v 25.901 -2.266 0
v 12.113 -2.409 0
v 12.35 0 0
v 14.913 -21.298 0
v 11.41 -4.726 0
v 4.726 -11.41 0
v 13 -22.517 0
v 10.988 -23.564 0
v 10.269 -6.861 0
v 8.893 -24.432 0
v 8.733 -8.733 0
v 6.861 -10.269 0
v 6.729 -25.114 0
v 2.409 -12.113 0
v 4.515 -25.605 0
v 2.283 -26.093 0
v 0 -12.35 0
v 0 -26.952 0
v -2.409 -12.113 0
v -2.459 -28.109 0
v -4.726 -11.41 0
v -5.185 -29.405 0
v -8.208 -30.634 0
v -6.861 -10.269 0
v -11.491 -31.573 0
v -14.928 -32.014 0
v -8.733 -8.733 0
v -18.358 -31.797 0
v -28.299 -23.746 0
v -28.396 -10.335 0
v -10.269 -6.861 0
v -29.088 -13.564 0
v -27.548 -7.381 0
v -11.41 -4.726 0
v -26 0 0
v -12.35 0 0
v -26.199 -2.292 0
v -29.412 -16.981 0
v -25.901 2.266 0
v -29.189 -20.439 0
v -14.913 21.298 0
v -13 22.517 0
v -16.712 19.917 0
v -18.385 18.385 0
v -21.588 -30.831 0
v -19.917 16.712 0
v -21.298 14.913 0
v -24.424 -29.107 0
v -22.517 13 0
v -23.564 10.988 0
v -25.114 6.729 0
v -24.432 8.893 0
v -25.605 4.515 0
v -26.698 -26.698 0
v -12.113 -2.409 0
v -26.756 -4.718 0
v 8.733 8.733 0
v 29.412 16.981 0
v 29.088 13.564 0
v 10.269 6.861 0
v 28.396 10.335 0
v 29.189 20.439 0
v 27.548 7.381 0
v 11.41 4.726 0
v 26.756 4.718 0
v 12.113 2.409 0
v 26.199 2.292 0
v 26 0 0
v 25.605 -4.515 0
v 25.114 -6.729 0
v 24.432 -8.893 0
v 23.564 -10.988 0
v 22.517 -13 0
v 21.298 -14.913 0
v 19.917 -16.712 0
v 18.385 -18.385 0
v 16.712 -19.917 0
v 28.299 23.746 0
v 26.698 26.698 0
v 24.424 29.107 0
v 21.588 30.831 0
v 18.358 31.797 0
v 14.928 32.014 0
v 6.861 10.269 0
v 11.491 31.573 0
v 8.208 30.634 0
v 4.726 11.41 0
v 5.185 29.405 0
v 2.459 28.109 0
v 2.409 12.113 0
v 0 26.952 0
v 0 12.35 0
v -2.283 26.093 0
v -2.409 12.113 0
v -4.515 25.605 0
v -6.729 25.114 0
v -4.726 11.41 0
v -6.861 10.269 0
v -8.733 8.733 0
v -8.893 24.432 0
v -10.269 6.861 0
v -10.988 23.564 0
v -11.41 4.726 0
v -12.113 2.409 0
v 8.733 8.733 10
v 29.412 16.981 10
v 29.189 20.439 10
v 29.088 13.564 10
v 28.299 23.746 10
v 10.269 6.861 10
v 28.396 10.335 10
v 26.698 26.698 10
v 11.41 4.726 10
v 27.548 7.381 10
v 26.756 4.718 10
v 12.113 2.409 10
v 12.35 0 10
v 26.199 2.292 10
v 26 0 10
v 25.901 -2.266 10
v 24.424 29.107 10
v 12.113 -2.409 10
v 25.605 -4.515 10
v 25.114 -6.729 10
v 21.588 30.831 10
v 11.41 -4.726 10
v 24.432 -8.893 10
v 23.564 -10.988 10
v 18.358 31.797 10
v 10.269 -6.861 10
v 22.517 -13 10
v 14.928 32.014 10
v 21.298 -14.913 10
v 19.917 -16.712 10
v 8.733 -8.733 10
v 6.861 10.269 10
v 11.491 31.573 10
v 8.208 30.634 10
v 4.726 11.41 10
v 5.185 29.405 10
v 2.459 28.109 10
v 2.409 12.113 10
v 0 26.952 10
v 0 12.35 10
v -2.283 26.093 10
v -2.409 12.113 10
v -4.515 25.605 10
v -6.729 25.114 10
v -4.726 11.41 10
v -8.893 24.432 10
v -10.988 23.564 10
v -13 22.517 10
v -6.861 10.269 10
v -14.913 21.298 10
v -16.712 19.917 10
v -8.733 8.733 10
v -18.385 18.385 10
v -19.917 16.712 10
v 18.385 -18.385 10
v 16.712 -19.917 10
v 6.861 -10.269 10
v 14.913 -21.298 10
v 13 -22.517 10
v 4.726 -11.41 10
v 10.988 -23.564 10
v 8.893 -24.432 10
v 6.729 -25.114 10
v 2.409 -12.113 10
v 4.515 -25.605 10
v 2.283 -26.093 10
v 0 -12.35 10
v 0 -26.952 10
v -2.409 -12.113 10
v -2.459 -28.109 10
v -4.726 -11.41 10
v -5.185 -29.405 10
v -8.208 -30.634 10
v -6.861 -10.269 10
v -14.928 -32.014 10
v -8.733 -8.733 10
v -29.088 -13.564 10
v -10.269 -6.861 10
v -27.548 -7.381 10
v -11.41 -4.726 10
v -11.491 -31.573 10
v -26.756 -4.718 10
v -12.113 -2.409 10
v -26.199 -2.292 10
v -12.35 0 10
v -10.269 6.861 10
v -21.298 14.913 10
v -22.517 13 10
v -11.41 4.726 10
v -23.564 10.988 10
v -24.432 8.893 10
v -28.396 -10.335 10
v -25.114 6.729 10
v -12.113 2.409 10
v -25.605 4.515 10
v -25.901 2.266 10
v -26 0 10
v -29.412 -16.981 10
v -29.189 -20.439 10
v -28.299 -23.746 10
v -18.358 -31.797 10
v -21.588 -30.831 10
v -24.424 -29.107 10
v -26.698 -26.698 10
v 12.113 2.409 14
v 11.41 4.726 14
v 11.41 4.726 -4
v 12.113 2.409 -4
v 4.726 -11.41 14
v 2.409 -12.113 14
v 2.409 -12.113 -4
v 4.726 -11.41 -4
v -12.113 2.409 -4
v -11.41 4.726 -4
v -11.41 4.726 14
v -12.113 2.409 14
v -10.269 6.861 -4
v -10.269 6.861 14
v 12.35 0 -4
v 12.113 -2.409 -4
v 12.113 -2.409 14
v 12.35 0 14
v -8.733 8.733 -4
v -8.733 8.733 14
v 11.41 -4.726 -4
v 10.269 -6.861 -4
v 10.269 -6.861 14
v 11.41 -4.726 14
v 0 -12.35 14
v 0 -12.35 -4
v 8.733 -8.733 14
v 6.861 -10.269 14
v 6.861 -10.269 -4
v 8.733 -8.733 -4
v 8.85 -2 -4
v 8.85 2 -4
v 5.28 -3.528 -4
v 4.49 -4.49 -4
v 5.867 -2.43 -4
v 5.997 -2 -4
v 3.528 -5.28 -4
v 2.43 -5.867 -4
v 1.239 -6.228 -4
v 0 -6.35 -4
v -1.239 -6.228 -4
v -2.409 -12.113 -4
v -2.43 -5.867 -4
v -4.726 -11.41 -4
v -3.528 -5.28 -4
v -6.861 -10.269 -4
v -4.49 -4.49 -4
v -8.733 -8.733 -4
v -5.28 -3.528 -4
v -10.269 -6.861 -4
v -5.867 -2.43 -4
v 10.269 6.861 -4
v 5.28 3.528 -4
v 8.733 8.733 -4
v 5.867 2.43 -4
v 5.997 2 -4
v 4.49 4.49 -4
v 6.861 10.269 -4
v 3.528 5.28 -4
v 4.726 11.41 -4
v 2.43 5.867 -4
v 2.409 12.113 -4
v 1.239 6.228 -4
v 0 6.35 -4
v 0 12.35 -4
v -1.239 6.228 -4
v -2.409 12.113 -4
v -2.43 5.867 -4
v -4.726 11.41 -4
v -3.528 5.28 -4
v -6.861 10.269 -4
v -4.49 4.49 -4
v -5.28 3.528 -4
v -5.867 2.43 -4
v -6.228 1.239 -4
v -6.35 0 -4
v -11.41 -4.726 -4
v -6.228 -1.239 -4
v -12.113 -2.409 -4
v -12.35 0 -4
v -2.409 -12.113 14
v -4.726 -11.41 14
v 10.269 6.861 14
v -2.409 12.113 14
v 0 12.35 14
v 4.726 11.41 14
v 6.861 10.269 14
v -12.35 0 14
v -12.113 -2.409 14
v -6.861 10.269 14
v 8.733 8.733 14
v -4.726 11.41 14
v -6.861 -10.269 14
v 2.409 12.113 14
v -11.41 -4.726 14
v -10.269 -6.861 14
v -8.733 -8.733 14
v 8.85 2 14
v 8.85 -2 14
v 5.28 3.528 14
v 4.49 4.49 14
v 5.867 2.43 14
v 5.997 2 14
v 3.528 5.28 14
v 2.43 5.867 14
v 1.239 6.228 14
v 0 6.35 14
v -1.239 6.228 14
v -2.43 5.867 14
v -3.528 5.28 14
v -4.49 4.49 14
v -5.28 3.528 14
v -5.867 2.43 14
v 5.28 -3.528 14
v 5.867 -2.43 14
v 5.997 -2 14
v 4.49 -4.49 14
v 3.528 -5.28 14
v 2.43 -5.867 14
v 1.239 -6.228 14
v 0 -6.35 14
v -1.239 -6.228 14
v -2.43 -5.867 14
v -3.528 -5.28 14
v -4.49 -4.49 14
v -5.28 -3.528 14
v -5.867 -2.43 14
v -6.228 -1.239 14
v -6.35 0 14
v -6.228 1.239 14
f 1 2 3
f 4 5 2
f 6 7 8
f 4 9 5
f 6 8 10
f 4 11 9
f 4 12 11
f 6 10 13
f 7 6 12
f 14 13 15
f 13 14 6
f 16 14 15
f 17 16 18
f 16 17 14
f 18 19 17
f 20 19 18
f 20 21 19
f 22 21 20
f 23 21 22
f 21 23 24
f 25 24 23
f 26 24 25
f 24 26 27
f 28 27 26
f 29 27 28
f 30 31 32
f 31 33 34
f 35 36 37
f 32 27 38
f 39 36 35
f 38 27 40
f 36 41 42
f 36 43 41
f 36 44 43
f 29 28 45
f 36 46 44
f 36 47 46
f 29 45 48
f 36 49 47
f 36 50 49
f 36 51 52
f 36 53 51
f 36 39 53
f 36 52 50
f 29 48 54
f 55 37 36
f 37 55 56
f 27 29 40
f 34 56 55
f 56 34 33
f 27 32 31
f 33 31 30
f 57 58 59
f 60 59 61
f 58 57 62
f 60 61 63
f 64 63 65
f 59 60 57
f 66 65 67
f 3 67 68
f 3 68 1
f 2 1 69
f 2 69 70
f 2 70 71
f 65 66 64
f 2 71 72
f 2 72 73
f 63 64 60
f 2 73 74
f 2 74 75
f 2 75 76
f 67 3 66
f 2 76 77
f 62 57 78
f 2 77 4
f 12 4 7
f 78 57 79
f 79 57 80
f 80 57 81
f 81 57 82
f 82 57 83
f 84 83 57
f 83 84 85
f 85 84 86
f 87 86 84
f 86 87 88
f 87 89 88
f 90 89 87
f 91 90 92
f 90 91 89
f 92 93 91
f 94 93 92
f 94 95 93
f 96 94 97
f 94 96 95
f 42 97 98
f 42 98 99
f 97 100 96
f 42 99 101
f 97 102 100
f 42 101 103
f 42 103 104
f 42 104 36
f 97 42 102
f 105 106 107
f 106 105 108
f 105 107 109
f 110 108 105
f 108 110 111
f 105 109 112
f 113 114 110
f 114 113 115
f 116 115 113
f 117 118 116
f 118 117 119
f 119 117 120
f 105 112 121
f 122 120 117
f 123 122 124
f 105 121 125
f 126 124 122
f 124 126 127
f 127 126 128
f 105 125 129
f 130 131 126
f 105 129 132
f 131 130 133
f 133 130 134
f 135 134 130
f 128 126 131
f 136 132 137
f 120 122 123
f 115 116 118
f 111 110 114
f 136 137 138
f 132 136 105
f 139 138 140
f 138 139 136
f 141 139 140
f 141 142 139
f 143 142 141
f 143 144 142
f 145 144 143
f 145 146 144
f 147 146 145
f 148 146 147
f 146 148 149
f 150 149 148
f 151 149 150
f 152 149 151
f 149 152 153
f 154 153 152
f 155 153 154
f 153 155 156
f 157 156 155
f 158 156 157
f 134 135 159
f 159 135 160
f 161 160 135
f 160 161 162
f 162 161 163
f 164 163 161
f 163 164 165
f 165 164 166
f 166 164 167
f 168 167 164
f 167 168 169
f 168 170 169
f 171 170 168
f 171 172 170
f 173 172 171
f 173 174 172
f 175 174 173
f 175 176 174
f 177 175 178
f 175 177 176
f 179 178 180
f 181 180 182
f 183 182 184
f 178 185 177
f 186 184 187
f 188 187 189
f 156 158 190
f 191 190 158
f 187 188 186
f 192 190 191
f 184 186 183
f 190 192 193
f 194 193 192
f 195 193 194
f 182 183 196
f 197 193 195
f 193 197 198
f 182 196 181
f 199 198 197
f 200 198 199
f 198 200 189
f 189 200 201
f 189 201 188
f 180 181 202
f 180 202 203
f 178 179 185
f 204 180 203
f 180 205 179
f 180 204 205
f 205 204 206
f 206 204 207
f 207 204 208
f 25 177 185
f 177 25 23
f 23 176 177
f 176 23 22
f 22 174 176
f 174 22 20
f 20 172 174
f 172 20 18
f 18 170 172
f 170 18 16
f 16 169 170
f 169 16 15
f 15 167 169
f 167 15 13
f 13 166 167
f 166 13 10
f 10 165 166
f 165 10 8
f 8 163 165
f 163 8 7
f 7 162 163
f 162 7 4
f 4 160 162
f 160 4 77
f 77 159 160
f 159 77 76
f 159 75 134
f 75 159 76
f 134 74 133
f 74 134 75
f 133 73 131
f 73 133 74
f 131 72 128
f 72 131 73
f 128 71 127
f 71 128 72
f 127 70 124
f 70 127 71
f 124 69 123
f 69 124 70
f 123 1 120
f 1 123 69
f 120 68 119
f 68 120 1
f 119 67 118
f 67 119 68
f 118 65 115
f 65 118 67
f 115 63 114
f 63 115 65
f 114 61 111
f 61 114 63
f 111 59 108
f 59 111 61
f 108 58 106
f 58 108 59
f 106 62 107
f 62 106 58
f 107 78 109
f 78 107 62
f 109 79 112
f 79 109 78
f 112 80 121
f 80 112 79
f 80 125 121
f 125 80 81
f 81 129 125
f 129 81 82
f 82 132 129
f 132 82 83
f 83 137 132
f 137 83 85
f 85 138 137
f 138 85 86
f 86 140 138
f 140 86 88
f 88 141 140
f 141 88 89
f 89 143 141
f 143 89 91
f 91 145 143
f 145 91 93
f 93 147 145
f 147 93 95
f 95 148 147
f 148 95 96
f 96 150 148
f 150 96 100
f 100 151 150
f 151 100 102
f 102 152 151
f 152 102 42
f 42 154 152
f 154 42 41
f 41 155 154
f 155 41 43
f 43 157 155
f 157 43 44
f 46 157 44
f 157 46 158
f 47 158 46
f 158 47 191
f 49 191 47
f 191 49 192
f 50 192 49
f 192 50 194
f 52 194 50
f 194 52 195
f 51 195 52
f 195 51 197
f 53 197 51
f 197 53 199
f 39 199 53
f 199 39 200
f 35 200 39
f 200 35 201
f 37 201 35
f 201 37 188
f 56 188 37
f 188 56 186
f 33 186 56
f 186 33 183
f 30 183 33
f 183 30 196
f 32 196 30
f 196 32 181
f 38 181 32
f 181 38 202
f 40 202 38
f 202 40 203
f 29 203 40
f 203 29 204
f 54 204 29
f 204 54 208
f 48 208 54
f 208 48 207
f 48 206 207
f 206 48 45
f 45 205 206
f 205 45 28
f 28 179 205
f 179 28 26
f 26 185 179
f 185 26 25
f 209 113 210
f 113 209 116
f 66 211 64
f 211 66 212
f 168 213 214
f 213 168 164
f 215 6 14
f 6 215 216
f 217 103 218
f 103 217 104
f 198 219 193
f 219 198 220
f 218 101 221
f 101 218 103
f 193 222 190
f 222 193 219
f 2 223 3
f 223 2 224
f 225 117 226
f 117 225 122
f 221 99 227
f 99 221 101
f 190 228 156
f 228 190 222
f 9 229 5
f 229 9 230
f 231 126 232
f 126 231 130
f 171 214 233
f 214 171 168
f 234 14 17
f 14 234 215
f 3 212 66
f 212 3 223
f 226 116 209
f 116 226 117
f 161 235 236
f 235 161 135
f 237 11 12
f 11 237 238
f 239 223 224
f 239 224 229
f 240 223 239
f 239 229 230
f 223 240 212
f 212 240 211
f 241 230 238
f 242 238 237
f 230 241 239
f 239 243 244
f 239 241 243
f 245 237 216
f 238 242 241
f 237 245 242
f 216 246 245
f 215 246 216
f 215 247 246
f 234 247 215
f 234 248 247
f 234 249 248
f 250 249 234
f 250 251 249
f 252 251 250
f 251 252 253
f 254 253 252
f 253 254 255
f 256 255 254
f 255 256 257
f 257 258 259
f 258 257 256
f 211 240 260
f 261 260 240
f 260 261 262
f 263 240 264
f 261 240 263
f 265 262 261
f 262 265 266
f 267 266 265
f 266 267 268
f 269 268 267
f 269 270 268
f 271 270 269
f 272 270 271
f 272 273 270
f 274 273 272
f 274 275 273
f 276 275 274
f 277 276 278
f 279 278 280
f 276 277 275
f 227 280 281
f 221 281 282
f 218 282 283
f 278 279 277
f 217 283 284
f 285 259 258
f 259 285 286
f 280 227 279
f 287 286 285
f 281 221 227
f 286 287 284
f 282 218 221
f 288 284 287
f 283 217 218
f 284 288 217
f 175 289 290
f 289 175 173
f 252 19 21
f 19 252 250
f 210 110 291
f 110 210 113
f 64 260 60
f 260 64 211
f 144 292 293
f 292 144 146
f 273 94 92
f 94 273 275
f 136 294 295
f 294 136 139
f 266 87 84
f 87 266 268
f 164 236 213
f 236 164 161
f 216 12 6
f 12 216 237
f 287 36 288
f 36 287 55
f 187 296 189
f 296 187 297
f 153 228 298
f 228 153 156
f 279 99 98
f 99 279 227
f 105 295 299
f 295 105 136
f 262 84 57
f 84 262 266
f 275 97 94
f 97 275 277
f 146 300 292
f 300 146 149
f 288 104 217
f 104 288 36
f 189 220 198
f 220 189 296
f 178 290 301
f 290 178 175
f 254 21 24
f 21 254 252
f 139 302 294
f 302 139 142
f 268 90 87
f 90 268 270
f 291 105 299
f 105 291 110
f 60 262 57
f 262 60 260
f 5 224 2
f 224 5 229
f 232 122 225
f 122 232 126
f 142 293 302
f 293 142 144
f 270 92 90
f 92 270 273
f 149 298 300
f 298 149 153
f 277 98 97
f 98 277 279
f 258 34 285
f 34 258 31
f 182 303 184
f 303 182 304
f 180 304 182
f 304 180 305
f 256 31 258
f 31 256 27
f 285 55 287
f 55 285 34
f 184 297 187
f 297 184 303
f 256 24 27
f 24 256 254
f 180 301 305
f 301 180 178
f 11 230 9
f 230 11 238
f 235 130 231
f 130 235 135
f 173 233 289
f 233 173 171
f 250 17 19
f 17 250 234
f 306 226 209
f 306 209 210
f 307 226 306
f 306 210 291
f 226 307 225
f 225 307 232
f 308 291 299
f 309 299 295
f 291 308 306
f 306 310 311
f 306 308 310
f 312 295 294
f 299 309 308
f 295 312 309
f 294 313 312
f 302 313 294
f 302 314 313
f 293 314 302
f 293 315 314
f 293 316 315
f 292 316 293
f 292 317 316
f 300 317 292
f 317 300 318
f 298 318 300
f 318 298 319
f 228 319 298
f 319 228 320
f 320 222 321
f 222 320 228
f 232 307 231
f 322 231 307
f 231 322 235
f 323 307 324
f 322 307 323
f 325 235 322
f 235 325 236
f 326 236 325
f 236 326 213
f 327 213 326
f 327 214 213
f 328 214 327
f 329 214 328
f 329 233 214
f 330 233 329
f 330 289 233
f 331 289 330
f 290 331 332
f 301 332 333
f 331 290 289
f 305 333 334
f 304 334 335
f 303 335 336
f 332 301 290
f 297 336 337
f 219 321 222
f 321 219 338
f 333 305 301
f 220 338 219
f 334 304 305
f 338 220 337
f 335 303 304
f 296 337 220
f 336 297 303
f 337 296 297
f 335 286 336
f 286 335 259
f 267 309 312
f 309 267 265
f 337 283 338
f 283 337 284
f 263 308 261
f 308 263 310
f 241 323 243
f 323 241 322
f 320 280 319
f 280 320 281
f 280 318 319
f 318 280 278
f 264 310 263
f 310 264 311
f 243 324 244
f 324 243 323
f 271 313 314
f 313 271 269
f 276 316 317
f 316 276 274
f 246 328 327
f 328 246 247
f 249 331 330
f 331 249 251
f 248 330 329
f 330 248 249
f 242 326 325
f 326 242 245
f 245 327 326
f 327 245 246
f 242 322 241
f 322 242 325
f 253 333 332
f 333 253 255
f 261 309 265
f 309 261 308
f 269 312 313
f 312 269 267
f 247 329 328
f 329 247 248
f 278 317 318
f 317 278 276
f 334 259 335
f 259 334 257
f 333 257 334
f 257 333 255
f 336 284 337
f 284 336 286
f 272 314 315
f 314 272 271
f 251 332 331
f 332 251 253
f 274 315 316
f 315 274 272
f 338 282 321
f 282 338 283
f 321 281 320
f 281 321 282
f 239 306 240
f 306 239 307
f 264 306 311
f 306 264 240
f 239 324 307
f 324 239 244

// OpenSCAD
$fn = 32;

// ----------------------------------------------------------------------
// Cam: base radius 26 mm with a 12 mm lift over 180 degrees
// ----------------------------------------------------------------------

// --- parameters (mm) ---
base_r = 26;              // base radius
lift = 12;                // lift height above the base radius
lift_span = 180;          // angular width of the lift
lift_start = 0;           // angle where the lift starts
cam_t = 10;               // cam plate thickness
hub_d = 24.7;             // hub diameter
hub_h = 18;               // hub height
bore_d = 12.7;            // bore
key_w = 4;                // keyway width
key_depth = 2;            // keyway depth

cam_profile = [[26, 0], [26.199, 2.292], [26.756, 4.718], [27.548, 7.381], [28.396, 10.335], [29.088, 13.564], [29.412, 16.981], [29.189, 20.439], [28.299, 23.746], [26.698, 26.698], [24.424, 29.107], [21.588, 30.831], [18.358, 31.797], [14.928, 32.014], [11.491, 31.573], [8.208, 30.634], [5.185, 29.405], [2.459, 28.109], [0, 26.952], [-2.283, 26.093], [-4.515, 25.605], [-6.729, 25.114], [-8.893, 24.432], [-10.988, 23.564], [-13, 22.517], [-14.913, 21.298], [-16.712, 19.917], [-18.385, 18.385], [-19.917, 16.712], [-21.298, 14.913], [-22.517, 13], [-23.564, 10.988], [-24.432, 8.893], [-25.114, 6.729], [-25.605, 4.515], [-25.901, 2.266], [-26, 0], [-26.199, -2.292], [-26.756, -4.718], [-27.548, -7.381], [-28.396, -10.335], [-29.088, -13.564], [-29.412, -16.981], [-29.189, -20.439], [-28.299, -23.746], [-26.698, -26.698], [-24.424, -29.107], [-21.588, -30.831], [-18.358, -31.797], [-14.928, -32.014], [-11.491, -31.573], [-8.208, -30.634], [-5.185, -29.405], [-2.459, -28.109], [0, -26.952], [2.283, -26.093], [4.515, -25.605], [6.729, -25.114], [8.893, -24.432], [10.988, -23.564], [13, -22.517], [14.913, -21.298], [16.712, -19.917], [18.385, -18.385], [19.917, -16.712], [21.298, -14.913], [22.517, -13], [23.564, -10.988], [24.432, -8.893], [25.114, -6.729], [25.605, -4.515], [25.901, -2.266]];

difference() {
  union() {
    linear_extrude(height = cam_t) polygon(cam_profile);
    /* hub, proud of the cam plate on both sides */
    translate([0, 0, -4]) cylinder(h = hub_h, d = hub_d);
  }
  /* bore through the hub, 2.5 mm clear on both faces */
  translate([0, 0, -6.5]) cylinder(h = hub_h + 5, d = bore_d);
  /* keyway, milled through the whole hub */
  translate([4.35, -2, -6.5]) cube([4.5, 4, 23]);
}
